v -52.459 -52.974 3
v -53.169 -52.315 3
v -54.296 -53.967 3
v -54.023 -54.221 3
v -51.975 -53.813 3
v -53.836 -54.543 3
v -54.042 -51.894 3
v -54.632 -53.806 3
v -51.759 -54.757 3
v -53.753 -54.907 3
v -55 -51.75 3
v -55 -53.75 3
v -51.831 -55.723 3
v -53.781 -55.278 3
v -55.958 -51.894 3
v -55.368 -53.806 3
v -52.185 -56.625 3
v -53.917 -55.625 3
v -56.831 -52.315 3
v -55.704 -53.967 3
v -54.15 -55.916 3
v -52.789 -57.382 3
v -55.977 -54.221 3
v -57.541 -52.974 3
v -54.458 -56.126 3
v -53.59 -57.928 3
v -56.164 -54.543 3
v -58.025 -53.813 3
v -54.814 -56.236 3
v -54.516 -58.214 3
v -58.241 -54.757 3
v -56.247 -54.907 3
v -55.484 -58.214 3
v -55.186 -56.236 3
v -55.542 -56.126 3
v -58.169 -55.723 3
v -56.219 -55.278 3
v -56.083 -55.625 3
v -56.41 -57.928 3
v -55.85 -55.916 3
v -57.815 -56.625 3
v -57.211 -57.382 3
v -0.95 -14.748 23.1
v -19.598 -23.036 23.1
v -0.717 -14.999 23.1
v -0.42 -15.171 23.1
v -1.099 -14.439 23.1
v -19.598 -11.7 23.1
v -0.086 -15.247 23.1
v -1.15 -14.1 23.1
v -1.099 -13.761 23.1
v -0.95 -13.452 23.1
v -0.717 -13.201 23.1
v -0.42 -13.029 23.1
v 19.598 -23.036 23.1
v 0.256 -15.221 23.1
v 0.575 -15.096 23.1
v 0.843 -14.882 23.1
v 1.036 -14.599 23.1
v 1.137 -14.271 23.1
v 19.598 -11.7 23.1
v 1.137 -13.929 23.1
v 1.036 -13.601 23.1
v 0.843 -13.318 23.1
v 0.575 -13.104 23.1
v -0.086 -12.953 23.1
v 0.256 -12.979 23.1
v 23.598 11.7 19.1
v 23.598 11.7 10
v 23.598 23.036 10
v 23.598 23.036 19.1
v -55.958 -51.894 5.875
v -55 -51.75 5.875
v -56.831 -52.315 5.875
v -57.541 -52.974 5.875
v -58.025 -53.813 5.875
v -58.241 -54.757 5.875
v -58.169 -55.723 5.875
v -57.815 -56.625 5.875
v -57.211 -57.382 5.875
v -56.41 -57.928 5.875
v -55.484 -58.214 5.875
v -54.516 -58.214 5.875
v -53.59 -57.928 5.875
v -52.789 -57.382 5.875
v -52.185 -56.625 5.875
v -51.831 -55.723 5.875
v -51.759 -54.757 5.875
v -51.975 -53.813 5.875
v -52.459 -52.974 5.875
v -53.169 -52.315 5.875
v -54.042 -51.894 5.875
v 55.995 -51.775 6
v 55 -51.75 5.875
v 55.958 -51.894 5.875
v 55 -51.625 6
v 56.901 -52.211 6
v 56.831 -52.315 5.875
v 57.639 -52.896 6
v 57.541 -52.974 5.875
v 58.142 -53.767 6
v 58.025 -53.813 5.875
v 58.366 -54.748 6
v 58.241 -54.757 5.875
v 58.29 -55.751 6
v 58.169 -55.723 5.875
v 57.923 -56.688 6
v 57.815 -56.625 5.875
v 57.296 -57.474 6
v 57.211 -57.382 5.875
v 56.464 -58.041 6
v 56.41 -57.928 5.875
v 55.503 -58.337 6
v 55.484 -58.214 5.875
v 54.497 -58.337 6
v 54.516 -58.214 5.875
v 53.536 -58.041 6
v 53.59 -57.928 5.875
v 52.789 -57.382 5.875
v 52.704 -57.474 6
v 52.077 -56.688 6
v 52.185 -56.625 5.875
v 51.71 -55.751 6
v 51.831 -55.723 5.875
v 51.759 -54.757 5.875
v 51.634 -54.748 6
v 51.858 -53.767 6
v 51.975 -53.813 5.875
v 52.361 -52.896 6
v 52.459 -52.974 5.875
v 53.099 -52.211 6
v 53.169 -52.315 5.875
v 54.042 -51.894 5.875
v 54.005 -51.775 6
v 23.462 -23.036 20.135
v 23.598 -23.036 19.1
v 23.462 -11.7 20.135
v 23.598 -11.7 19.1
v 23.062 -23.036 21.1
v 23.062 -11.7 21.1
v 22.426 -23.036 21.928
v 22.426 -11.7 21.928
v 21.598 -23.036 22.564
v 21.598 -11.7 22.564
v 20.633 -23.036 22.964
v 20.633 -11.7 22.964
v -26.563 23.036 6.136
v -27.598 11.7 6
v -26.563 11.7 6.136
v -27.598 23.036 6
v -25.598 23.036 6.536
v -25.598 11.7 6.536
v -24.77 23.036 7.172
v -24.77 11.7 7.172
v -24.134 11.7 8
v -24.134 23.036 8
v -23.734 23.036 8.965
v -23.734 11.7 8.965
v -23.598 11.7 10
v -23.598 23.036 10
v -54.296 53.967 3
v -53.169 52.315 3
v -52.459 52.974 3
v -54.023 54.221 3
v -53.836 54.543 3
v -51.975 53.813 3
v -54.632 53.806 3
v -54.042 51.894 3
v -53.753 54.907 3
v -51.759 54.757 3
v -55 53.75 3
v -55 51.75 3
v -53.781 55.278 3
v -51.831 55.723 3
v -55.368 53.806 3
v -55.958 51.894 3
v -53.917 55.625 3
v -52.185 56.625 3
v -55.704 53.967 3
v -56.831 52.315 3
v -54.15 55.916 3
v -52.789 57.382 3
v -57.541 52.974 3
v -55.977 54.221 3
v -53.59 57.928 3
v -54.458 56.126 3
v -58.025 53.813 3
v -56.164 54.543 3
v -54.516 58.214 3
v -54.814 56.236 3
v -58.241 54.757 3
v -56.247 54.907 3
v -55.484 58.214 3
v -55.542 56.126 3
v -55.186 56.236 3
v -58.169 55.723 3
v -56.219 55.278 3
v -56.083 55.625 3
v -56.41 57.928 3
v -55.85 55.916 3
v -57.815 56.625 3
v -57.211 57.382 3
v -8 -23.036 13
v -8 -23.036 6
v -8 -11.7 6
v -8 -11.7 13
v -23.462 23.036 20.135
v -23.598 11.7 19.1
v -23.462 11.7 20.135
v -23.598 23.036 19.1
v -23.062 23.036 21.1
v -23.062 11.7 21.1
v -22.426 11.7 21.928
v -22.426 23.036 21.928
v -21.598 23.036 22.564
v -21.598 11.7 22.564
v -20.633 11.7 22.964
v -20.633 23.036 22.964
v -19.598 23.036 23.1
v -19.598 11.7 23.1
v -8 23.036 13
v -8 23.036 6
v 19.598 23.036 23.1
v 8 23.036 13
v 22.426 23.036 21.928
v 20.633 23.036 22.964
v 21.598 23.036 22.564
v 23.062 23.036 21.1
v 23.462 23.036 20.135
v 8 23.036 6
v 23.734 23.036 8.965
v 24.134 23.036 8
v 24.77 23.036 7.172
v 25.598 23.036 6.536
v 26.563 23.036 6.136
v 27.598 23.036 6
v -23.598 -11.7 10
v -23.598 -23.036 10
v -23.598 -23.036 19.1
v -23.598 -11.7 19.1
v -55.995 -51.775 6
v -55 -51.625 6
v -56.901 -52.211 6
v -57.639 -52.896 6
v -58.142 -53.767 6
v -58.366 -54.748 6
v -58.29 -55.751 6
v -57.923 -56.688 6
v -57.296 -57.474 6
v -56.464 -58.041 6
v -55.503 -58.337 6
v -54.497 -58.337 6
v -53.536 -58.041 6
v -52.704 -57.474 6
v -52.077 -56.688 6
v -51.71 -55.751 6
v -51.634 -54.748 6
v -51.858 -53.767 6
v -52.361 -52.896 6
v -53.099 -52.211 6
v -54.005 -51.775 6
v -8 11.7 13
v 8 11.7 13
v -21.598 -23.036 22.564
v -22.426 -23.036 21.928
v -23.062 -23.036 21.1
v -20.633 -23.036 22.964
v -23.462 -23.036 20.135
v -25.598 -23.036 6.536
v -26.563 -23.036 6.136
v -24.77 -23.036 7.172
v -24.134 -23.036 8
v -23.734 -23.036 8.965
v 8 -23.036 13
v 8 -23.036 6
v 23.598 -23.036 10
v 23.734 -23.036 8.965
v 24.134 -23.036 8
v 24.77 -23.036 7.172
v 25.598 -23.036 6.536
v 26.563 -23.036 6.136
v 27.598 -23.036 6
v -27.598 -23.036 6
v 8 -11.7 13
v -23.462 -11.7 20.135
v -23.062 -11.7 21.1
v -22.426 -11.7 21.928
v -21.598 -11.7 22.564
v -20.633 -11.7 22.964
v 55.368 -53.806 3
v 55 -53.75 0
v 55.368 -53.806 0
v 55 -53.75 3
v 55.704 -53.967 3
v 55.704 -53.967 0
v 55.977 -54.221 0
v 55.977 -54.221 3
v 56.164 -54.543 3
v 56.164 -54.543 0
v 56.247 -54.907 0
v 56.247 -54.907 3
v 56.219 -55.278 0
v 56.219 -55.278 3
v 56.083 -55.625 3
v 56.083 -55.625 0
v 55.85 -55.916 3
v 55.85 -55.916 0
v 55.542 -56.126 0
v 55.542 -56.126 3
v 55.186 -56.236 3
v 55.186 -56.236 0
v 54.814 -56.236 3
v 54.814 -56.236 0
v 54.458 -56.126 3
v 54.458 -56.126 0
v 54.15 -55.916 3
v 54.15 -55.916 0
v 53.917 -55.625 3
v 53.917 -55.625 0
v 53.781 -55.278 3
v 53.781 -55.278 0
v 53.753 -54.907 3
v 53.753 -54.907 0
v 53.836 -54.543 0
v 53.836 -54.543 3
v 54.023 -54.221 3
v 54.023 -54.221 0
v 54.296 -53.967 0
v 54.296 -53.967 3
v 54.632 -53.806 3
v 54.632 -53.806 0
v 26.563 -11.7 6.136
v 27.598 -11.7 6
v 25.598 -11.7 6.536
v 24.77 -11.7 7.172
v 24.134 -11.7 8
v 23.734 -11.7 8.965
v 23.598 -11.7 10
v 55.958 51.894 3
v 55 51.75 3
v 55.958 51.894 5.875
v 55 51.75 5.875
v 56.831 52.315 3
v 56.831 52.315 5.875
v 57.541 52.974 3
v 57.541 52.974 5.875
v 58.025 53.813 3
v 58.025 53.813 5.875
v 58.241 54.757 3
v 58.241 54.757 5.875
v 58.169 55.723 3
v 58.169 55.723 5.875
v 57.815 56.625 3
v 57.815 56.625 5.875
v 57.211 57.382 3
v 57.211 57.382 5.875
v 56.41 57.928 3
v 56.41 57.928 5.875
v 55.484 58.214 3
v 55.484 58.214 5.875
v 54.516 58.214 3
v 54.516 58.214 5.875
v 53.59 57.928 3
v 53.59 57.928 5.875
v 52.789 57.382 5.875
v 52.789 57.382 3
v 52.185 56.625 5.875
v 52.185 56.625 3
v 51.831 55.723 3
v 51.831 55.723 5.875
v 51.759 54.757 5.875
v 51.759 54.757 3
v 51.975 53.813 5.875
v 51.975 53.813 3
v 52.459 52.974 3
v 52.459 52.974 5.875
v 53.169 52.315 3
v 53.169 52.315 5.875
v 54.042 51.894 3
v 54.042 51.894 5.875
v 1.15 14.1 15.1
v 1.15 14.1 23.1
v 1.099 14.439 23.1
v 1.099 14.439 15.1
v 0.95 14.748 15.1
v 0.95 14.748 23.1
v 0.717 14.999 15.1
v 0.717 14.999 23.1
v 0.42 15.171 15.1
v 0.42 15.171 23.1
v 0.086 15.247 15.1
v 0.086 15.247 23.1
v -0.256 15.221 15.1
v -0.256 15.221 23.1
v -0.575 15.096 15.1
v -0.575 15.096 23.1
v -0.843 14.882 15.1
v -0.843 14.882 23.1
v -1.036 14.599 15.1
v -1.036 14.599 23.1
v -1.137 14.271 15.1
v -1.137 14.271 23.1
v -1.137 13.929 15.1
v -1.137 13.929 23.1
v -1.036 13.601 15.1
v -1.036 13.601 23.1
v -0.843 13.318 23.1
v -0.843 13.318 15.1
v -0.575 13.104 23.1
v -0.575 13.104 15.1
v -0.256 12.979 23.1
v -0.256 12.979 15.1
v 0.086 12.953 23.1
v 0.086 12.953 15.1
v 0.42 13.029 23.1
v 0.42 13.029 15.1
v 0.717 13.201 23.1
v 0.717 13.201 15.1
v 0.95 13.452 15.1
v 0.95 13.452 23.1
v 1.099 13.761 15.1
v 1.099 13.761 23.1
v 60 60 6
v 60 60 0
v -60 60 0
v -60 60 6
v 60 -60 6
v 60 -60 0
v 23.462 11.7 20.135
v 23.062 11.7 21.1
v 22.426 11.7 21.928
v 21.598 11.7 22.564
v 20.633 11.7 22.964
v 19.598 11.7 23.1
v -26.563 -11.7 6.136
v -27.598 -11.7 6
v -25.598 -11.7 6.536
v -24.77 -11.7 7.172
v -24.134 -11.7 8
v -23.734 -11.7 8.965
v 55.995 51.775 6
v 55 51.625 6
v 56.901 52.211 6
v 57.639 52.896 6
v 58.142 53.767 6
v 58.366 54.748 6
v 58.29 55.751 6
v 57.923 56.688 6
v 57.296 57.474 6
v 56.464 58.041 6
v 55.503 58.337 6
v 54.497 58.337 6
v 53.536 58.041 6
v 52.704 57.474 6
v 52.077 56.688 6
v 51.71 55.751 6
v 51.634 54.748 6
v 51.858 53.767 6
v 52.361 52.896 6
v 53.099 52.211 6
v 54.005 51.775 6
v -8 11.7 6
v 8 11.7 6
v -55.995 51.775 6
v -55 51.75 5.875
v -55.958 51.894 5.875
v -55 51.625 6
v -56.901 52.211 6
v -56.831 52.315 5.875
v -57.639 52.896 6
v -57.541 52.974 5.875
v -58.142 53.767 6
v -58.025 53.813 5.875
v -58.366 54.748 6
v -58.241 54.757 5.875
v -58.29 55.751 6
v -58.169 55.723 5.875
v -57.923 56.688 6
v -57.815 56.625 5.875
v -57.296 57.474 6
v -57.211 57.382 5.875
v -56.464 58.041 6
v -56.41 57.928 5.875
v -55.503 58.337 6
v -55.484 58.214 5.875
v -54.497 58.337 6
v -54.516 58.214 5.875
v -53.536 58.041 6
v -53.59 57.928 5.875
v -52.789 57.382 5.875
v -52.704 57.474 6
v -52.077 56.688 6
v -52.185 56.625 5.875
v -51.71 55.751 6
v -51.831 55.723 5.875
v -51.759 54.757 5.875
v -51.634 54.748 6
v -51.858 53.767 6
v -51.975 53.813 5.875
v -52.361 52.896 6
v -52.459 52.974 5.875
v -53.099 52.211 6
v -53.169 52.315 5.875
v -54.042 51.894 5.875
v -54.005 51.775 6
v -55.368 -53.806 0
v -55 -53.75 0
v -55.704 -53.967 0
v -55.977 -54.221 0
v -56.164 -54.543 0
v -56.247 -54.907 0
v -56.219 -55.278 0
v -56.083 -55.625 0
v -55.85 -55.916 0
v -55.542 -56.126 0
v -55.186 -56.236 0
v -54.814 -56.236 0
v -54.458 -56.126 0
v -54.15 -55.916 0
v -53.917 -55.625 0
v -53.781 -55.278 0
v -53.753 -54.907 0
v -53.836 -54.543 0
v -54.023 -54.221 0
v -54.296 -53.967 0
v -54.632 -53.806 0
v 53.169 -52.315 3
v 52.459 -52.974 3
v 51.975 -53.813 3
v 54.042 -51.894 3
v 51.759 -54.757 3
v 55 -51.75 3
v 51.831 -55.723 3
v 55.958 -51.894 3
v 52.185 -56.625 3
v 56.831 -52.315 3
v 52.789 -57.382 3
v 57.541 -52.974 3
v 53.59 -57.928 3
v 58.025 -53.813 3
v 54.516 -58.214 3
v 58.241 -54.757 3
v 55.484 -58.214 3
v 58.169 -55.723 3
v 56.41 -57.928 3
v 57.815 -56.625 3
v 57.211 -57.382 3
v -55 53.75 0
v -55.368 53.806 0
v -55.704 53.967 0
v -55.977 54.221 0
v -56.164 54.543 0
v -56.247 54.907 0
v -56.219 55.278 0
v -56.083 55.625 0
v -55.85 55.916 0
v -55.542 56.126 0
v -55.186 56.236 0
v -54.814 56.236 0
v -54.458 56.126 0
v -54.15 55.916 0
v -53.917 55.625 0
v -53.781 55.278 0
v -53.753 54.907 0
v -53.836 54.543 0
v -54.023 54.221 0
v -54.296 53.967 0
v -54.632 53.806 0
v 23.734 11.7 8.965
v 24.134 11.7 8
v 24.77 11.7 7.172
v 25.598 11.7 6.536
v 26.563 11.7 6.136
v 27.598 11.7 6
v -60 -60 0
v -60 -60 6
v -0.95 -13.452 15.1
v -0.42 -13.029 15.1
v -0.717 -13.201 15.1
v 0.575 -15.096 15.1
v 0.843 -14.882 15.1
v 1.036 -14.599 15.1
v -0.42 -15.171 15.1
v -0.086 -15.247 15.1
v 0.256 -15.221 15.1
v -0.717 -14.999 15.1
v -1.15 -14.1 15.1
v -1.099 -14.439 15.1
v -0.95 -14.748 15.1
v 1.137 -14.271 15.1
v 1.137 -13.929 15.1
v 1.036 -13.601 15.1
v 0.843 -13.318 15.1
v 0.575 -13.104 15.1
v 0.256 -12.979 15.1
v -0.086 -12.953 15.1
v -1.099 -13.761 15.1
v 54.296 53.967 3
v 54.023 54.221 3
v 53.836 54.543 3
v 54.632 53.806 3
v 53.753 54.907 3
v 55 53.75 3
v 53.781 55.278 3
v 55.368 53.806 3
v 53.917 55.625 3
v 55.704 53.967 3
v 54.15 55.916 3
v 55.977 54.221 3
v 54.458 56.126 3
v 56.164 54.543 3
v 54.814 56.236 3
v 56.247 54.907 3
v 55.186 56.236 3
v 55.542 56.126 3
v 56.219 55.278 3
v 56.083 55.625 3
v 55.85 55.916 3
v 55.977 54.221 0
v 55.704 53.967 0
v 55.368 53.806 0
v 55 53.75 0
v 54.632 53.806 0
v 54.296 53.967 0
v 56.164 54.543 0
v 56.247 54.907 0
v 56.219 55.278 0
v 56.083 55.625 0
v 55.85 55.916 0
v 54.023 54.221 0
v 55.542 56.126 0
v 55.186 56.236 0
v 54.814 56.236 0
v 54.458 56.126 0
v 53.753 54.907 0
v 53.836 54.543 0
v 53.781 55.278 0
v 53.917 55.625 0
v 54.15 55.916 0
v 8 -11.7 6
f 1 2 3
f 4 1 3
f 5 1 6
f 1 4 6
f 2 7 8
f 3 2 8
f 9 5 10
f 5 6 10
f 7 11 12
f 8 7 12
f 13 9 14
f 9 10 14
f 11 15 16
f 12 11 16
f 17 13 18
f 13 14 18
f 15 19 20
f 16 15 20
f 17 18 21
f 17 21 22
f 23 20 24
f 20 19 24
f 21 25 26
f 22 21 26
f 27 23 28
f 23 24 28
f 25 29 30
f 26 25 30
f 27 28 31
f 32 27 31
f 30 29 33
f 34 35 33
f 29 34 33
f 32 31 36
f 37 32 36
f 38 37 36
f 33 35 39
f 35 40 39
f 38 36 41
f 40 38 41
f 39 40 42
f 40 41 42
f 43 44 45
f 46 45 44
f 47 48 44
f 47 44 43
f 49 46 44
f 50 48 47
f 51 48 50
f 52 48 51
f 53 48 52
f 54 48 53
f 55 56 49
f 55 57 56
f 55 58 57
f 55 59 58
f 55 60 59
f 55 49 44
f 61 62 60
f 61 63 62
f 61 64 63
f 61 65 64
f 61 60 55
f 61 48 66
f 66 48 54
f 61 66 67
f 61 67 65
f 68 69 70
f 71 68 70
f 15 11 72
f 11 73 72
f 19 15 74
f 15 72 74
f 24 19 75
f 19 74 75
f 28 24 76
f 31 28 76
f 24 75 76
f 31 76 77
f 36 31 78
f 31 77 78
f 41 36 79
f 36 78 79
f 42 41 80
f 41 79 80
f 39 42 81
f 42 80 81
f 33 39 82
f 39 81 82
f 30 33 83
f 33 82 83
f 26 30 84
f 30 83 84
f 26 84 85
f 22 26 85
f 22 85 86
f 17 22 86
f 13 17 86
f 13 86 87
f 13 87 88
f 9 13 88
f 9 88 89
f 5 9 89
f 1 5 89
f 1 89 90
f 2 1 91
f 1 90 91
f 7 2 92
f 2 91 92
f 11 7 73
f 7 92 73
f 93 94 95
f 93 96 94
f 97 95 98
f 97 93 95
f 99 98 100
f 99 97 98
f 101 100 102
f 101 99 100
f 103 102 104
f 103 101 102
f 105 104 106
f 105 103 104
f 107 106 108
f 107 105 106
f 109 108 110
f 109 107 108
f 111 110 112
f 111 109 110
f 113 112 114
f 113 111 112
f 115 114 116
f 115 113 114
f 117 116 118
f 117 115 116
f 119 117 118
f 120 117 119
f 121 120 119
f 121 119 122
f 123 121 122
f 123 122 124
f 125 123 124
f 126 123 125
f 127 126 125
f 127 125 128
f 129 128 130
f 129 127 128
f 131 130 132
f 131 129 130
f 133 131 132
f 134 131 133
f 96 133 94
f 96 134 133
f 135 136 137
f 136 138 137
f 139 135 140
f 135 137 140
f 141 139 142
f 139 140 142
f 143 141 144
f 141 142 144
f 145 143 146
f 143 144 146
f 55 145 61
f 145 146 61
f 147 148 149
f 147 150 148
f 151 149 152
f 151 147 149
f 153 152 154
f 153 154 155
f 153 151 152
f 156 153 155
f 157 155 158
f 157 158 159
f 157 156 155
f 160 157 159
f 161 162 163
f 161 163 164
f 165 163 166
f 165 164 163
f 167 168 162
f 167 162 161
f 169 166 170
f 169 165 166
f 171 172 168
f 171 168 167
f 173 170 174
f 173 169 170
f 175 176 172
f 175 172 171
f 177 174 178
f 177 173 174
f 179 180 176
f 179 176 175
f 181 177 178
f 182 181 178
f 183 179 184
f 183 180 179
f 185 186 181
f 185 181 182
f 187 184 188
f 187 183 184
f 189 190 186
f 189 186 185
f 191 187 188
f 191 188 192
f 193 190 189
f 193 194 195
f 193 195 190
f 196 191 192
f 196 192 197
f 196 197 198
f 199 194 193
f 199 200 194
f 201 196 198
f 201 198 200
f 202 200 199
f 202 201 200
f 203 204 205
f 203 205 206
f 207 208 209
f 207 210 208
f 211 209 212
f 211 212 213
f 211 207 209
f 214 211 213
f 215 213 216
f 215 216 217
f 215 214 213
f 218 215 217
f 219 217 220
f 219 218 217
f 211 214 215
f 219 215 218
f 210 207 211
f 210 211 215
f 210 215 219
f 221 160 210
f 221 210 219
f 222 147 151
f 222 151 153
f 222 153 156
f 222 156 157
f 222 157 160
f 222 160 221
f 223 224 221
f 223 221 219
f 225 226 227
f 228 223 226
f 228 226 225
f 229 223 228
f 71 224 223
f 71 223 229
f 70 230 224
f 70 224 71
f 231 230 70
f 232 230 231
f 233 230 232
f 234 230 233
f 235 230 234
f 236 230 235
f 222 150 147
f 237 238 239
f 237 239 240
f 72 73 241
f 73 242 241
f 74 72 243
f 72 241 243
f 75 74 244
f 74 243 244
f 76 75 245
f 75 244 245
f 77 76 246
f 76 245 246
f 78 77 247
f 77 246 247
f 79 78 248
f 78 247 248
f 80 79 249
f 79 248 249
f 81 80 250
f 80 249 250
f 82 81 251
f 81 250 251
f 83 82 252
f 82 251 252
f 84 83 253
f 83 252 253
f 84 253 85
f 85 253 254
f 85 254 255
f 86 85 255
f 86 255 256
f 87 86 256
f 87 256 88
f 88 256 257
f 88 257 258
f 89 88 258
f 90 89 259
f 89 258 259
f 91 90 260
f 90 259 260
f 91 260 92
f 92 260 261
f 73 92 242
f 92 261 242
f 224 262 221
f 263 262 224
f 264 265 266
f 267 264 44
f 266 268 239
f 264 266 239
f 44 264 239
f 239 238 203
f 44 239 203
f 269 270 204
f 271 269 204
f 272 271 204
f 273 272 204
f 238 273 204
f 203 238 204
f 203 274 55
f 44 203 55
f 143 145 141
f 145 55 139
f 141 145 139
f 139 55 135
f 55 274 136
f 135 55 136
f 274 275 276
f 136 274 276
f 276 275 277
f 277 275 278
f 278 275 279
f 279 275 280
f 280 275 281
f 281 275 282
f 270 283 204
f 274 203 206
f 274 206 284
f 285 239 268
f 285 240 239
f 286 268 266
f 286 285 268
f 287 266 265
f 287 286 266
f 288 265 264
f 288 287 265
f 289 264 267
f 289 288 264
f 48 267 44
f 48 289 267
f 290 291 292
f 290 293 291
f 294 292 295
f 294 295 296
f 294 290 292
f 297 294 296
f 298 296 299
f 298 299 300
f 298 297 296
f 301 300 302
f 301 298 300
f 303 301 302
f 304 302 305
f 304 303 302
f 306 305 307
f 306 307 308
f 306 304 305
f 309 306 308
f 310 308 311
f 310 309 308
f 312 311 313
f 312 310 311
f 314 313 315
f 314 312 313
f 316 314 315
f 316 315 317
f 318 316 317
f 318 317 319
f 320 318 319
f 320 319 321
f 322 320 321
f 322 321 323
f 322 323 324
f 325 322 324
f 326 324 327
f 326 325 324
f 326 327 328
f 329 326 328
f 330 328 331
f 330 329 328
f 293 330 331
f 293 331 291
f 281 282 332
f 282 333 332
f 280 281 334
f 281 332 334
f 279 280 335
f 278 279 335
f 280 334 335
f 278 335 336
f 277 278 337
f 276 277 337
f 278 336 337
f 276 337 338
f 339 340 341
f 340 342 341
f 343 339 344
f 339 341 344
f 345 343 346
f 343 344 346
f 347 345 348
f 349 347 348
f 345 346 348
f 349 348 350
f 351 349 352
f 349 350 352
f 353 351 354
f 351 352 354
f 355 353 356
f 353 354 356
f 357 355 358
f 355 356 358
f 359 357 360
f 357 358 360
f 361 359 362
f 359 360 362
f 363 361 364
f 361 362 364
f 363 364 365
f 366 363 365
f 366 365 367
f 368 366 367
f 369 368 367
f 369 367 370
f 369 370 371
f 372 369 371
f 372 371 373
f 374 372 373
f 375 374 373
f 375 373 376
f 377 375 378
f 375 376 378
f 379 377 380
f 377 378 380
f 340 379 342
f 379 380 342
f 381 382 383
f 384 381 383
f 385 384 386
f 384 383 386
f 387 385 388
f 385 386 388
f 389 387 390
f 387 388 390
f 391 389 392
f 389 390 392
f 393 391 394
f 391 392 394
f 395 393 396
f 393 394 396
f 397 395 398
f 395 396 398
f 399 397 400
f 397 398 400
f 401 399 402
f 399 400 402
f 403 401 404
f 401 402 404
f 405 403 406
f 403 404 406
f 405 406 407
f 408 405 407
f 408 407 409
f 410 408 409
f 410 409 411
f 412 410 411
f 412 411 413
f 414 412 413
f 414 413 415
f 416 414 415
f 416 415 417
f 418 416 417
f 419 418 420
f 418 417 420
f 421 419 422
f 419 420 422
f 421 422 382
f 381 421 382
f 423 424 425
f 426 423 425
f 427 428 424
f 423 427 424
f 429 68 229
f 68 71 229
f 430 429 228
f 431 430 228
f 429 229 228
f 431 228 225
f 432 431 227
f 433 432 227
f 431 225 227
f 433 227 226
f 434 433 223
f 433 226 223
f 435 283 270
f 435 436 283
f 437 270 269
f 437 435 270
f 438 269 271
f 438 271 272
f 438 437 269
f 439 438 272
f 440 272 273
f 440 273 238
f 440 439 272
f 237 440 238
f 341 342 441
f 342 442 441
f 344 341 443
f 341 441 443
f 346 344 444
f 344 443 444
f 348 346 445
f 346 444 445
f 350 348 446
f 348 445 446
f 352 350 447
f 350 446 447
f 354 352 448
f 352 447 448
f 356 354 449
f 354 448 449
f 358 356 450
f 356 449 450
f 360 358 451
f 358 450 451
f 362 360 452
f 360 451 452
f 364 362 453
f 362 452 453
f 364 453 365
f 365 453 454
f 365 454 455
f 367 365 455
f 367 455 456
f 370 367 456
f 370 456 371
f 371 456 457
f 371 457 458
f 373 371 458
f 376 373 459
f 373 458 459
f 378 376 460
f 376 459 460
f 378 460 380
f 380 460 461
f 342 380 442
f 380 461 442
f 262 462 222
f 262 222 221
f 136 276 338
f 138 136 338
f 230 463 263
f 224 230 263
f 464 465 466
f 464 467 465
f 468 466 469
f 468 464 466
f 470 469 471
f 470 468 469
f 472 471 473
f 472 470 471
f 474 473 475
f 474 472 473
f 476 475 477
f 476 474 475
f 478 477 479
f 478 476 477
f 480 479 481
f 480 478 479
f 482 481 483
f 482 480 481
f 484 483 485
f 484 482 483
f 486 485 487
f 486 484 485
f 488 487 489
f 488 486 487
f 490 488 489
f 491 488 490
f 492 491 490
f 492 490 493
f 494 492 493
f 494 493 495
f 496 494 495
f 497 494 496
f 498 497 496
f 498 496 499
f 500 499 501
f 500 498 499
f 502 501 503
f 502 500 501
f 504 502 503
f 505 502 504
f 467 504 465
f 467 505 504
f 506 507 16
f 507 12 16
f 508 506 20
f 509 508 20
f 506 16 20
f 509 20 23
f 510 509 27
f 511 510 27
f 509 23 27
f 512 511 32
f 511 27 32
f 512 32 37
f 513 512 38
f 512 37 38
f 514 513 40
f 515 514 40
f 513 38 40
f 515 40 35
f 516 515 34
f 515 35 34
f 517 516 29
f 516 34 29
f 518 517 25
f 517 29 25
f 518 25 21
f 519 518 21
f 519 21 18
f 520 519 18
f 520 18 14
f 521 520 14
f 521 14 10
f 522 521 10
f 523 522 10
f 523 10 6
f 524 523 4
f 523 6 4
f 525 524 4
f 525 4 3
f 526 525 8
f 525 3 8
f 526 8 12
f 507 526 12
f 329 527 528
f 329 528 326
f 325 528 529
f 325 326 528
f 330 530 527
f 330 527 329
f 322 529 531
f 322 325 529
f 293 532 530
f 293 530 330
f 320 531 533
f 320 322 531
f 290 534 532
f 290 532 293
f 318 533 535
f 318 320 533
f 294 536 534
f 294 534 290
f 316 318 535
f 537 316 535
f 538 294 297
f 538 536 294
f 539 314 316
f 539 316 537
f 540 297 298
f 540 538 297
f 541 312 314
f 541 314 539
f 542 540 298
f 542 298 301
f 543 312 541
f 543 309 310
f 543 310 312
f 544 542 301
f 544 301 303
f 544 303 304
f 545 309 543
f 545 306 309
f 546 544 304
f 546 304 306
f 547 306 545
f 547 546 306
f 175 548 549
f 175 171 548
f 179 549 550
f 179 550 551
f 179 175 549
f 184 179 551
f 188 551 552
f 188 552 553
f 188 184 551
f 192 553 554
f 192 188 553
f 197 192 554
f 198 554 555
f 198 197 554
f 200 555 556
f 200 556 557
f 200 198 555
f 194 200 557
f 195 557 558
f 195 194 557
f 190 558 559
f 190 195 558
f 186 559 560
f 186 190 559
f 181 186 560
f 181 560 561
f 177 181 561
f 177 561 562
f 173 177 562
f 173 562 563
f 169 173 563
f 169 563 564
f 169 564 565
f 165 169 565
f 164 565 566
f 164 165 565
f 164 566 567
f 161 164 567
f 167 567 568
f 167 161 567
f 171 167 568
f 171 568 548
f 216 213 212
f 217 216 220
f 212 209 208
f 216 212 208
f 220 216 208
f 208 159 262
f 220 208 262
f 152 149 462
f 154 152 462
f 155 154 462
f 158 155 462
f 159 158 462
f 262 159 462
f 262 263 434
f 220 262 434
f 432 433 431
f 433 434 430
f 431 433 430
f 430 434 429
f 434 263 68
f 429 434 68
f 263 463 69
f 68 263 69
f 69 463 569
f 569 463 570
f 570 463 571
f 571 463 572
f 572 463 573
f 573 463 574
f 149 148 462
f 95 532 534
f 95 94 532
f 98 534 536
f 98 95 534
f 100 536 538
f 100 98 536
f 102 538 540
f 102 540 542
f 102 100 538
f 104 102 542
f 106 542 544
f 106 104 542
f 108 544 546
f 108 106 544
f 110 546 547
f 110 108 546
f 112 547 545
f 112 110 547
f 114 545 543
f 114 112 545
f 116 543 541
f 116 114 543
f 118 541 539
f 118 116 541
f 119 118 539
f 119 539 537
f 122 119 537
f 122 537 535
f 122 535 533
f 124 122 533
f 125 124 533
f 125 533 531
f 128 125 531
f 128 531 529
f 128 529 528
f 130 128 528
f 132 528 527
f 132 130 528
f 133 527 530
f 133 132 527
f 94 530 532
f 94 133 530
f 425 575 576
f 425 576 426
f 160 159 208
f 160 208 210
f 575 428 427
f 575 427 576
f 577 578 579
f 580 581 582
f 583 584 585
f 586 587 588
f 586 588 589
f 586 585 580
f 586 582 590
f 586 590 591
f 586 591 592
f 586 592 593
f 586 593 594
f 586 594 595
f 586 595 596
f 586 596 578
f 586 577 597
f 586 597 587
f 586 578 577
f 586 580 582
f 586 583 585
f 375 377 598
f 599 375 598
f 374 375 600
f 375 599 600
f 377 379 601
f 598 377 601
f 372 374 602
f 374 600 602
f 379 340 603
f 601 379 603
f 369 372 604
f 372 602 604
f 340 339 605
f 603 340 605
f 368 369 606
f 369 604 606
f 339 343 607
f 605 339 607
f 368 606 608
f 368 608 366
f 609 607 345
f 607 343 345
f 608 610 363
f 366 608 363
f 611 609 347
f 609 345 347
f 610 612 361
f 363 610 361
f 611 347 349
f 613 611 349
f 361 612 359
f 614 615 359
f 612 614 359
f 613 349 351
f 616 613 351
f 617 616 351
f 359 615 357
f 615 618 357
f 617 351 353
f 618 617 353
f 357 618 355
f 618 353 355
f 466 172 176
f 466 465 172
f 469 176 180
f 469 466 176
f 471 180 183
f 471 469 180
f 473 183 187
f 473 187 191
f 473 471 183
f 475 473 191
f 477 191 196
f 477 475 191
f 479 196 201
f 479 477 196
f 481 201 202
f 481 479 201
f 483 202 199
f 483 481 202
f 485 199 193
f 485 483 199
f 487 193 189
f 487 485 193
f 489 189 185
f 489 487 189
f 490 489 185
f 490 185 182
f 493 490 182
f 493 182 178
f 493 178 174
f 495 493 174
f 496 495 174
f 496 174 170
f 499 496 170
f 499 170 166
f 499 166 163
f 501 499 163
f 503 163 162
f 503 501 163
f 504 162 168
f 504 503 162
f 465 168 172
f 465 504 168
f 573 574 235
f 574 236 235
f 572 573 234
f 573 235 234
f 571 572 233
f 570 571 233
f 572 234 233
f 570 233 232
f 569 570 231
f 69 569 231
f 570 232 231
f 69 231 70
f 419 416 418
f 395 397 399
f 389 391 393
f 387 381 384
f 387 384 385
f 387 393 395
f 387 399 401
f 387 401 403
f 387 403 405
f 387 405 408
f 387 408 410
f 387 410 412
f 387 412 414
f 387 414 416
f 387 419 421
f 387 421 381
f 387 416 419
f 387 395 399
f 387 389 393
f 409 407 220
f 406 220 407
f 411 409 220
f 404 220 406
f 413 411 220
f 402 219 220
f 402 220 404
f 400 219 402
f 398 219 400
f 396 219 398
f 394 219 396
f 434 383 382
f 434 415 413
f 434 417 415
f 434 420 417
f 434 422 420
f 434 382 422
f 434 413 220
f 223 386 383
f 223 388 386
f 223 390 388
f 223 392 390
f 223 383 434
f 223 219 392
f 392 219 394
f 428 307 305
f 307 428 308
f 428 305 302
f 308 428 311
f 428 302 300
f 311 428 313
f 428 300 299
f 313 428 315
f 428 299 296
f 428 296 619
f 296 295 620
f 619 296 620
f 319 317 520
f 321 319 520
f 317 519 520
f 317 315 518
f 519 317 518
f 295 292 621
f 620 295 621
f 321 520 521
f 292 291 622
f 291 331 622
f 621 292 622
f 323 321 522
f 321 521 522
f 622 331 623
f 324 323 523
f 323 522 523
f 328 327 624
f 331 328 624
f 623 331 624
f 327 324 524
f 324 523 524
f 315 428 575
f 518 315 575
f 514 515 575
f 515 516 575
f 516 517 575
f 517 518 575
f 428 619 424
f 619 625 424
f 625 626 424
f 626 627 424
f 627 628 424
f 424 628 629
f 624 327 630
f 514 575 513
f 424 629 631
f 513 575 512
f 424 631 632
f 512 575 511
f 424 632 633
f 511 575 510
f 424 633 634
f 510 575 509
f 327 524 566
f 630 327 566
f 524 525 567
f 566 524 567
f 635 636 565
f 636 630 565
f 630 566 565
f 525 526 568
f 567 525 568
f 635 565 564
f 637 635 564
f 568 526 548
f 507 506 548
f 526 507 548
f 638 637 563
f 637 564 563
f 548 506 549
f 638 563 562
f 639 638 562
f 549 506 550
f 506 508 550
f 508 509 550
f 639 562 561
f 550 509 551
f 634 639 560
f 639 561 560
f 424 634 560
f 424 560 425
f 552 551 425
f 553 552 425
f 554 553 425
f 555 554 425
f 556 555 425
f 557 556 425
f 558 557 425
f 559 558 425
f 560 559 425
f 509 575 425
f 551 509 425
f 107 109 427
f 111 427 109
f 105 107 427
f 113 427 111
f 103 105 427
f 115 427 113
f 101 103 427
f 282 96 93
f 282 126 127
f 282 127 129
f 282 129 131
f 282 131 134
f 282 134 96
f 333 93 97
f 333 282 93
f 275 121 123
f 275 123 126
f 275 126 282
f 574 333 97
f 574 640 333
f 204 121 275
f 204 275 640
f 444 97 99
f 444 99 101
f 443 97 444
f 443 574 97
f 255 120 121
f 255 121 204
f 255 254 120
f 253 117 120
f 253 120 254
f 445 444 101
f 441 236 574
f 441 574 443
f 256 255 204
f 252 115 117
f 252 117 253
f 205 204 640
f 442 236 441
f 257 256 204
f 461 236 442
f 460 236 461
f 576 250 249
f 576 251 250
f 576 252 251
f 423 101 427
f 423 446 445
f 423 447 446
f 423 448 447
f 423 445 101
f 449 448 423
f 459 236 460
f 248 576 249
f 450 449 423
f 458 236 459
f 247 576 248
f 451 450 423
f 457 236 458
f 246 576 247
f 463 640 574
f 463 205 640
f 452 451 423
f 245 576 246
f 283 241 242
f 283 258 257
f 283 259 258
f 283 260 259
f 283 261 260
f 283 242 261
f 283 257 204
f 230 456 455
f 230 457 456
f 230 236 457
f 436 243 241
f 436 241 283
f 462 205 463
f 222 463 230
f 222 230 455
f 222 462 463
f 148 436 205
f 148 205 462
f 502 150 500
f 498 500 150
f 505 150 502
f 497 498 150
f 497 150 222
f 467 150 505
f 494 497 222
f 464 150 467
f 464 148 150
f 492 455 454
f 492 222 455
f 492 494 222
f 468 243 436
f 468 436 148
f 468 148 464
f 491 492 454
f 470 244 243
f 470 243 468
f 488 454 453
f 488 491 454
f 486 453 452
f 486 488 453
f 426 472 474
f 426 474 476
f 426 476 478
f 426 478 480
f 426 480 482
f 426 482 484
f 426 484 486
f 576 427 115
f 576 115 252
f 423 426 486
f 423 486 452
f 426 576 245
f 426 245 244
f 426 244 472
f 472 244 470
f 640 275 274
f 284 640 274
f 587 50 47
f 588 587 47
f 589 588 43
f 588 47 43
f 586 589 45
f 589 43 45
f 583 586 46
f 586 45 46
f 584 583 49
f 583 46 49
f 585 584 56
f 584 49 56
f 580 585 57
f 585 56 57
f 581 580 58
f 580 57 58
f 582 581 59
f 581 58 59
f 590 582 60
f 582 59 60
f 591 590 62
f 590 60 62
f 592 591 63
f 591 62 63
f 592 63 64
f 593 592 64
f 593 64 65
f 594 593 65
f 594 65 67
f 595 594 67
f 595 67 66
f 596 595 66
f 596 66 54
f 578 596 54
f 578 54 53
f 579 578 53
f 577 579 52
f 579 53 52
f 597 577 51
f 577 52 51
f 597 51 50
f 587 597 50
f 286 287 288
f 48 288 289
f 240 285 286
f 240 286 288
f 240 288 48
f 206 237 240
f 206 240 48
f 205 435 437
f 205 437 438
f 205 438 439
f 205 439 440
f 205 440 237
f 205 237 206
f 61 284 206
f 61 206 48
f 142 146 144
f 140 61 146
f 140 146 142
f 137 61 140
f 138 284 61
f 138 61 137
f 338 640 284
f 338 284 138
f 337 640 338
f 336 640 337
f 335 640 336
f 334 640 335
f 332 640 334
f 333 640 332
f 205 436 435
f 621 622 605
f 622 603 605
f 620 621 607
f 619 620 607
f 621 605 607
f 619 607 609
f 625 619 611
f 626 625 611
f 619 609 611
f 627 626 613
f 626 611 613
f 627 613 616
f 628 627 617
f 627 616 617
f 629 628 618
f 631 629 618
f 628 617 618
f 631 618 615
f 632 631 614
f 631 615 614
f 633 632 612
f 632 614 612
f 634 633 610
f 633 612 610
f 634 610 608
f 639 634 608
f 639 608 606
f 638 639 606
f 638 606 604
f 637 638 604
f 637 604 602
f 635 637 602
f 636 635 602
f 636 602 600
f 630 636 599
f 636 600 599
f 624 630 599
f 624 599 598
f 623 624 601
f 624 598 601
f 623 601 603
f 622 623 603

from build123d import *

# Parameters (mm, degrees)
SKETCH1_W           = 120
SKETCH1_H           = 120
BOSS_EXTRUDE1_DEPTH = 6
SKETCH3_W           = 47.19594468
SKETCH3_H           = 11.33645236
BOSS_EXTRUDE2_DEPTH = 17.1
SKETCH4_W           = 16
SKETCH4_H           = 7
CUT_EXTRUDE3_DEPTH  = 106.01743865
SKETCH6_R           = 1.15
CUT_EXTRUDE4_DEPTH  = 8
FILLET1_R           = 4


with BuildPart() as part:
    # Sketch1 → Boss-Extrude1 (new body)
    with BuildSketch(Plane(origin=(0, 0, 0), x_dir=(0, 1, 0), z_dir=(0, 0, 1))):
        Rectangle(SKETCH1_W, SKETCH1_H)
    extrude(amount=BOSS_EXTRUDE1_DEPTH)

    # Sketch7 → CBORE for M3 SBHCS1 (revolve, cut)
    with BuildSketch(Plane(origin=(-55, 55, 6), x_dir=(0, -1, 0), z_dir=(1, 0, 0))):
        Polygon((0, 0), (0, 6), (1.25, 6), (1.25, 3), (3.25, 3), (3.25, 0.125), (3.375, 0), align=None)
    cbore_for_m3_sbhcs1 = revolve(axis=Axis((-55, 55, 12.35), (0, 0, -1)), mode=Mode.SUBTRACT)

    # Mirror2: CBORE for M3 SBHCS1 across plane
    add(cbore_for_m3_sbhcs1.mirror(Plane(origin=(0, 0, 0), x_dir=(0, 0, 1), z_dir=(1, 0, 0))), mode=Mode.SUBTRACT)

    # Mirror2 at the second plane: CBORE for M3 SBHCS1 across plane
    add(cbore_for_m3_sbhcs1.mirror(Plane.ZX), mode=Mode.SUBTRACT)

    # Mirror2 at the second plane copy 1 sketc → Mirror2 at the second plane copy 1 (revolve, cut)
    with BuildSketch(Plane(origin=(55, -55, 6), x_dir=(0, 1, 0), z_dir=(-1, 0, 0))):
        Polygon((0, 0), (0, 6), (1.25, 6), (1.25, 3), (3.25, 3), (3.25, 0.125), (3.375, 0), align=None)
    revolve(axis=Axis((55, -55, 12.35), (0, 0, -1)), mode=Mode.SUBTRACT)

    # Sketch3 → Boss-Extrude2 (add)
    with BuildSketch(Plane.XY.offset(6)):
        with Locations((0, -17.36822618)):
            Rectangle(SKETCH3_W, SKETCH3_H)
        with Locations((0, 17.36822618)):
            Rectangle(SKETCH3_W, SKETCH3_H)
    extrude(amount=BOSS_EXTRUDE2_DEPTH)

    # Sketch4 → Cut-Extrude3 (cut, through all)
    with BuildSketch(Plane.XZ.offset(23.03645236)):
        with Locations((0, 9.5)):
            Rectangle(SKETCH4_W, SKETCH4_H)
    extrude(amount=-CUT_EXTRUDE3_DEPTH, mode=Mode.SUBTRACT)

    # Sketch6 → Cut-Extrude4 (cut)
    with BuildSketch(Plane.XY.offset(23.1)):
        with Locations((0, 14.1)):
            Circle(SKETCH6_R)
        with Locations(Location((0, -14.1, 0), (0, 0, 180))):
            Circle(SKETCH6_R)
    extrude(amount=-CUT_EXTRUDE4_DEPTH, mode=Mode.SUBTRACT)

    # Fillet1
    fillet1_edges = [part.edges().sort_by_distance(p)[0] for p in [
        (-23.59797234, -17.36822618, 6),
        (23.59797234, -17.36822618, 6),
        (-23.59797234, -17.36822618, 23.1),
        (23.59797234, -17.36822618, 23.1),
        (-23.59797234, 17.36822618, 6),
        (23.59797234, 17.36822618, 6),
        (-23.59797234, 17.36822618, 23.1),
        (23.59797234, 17.36822618, 23.1),
    ]]
    fillet(fillet1_edges, radius=FILLET1_R)


solid = part.part
